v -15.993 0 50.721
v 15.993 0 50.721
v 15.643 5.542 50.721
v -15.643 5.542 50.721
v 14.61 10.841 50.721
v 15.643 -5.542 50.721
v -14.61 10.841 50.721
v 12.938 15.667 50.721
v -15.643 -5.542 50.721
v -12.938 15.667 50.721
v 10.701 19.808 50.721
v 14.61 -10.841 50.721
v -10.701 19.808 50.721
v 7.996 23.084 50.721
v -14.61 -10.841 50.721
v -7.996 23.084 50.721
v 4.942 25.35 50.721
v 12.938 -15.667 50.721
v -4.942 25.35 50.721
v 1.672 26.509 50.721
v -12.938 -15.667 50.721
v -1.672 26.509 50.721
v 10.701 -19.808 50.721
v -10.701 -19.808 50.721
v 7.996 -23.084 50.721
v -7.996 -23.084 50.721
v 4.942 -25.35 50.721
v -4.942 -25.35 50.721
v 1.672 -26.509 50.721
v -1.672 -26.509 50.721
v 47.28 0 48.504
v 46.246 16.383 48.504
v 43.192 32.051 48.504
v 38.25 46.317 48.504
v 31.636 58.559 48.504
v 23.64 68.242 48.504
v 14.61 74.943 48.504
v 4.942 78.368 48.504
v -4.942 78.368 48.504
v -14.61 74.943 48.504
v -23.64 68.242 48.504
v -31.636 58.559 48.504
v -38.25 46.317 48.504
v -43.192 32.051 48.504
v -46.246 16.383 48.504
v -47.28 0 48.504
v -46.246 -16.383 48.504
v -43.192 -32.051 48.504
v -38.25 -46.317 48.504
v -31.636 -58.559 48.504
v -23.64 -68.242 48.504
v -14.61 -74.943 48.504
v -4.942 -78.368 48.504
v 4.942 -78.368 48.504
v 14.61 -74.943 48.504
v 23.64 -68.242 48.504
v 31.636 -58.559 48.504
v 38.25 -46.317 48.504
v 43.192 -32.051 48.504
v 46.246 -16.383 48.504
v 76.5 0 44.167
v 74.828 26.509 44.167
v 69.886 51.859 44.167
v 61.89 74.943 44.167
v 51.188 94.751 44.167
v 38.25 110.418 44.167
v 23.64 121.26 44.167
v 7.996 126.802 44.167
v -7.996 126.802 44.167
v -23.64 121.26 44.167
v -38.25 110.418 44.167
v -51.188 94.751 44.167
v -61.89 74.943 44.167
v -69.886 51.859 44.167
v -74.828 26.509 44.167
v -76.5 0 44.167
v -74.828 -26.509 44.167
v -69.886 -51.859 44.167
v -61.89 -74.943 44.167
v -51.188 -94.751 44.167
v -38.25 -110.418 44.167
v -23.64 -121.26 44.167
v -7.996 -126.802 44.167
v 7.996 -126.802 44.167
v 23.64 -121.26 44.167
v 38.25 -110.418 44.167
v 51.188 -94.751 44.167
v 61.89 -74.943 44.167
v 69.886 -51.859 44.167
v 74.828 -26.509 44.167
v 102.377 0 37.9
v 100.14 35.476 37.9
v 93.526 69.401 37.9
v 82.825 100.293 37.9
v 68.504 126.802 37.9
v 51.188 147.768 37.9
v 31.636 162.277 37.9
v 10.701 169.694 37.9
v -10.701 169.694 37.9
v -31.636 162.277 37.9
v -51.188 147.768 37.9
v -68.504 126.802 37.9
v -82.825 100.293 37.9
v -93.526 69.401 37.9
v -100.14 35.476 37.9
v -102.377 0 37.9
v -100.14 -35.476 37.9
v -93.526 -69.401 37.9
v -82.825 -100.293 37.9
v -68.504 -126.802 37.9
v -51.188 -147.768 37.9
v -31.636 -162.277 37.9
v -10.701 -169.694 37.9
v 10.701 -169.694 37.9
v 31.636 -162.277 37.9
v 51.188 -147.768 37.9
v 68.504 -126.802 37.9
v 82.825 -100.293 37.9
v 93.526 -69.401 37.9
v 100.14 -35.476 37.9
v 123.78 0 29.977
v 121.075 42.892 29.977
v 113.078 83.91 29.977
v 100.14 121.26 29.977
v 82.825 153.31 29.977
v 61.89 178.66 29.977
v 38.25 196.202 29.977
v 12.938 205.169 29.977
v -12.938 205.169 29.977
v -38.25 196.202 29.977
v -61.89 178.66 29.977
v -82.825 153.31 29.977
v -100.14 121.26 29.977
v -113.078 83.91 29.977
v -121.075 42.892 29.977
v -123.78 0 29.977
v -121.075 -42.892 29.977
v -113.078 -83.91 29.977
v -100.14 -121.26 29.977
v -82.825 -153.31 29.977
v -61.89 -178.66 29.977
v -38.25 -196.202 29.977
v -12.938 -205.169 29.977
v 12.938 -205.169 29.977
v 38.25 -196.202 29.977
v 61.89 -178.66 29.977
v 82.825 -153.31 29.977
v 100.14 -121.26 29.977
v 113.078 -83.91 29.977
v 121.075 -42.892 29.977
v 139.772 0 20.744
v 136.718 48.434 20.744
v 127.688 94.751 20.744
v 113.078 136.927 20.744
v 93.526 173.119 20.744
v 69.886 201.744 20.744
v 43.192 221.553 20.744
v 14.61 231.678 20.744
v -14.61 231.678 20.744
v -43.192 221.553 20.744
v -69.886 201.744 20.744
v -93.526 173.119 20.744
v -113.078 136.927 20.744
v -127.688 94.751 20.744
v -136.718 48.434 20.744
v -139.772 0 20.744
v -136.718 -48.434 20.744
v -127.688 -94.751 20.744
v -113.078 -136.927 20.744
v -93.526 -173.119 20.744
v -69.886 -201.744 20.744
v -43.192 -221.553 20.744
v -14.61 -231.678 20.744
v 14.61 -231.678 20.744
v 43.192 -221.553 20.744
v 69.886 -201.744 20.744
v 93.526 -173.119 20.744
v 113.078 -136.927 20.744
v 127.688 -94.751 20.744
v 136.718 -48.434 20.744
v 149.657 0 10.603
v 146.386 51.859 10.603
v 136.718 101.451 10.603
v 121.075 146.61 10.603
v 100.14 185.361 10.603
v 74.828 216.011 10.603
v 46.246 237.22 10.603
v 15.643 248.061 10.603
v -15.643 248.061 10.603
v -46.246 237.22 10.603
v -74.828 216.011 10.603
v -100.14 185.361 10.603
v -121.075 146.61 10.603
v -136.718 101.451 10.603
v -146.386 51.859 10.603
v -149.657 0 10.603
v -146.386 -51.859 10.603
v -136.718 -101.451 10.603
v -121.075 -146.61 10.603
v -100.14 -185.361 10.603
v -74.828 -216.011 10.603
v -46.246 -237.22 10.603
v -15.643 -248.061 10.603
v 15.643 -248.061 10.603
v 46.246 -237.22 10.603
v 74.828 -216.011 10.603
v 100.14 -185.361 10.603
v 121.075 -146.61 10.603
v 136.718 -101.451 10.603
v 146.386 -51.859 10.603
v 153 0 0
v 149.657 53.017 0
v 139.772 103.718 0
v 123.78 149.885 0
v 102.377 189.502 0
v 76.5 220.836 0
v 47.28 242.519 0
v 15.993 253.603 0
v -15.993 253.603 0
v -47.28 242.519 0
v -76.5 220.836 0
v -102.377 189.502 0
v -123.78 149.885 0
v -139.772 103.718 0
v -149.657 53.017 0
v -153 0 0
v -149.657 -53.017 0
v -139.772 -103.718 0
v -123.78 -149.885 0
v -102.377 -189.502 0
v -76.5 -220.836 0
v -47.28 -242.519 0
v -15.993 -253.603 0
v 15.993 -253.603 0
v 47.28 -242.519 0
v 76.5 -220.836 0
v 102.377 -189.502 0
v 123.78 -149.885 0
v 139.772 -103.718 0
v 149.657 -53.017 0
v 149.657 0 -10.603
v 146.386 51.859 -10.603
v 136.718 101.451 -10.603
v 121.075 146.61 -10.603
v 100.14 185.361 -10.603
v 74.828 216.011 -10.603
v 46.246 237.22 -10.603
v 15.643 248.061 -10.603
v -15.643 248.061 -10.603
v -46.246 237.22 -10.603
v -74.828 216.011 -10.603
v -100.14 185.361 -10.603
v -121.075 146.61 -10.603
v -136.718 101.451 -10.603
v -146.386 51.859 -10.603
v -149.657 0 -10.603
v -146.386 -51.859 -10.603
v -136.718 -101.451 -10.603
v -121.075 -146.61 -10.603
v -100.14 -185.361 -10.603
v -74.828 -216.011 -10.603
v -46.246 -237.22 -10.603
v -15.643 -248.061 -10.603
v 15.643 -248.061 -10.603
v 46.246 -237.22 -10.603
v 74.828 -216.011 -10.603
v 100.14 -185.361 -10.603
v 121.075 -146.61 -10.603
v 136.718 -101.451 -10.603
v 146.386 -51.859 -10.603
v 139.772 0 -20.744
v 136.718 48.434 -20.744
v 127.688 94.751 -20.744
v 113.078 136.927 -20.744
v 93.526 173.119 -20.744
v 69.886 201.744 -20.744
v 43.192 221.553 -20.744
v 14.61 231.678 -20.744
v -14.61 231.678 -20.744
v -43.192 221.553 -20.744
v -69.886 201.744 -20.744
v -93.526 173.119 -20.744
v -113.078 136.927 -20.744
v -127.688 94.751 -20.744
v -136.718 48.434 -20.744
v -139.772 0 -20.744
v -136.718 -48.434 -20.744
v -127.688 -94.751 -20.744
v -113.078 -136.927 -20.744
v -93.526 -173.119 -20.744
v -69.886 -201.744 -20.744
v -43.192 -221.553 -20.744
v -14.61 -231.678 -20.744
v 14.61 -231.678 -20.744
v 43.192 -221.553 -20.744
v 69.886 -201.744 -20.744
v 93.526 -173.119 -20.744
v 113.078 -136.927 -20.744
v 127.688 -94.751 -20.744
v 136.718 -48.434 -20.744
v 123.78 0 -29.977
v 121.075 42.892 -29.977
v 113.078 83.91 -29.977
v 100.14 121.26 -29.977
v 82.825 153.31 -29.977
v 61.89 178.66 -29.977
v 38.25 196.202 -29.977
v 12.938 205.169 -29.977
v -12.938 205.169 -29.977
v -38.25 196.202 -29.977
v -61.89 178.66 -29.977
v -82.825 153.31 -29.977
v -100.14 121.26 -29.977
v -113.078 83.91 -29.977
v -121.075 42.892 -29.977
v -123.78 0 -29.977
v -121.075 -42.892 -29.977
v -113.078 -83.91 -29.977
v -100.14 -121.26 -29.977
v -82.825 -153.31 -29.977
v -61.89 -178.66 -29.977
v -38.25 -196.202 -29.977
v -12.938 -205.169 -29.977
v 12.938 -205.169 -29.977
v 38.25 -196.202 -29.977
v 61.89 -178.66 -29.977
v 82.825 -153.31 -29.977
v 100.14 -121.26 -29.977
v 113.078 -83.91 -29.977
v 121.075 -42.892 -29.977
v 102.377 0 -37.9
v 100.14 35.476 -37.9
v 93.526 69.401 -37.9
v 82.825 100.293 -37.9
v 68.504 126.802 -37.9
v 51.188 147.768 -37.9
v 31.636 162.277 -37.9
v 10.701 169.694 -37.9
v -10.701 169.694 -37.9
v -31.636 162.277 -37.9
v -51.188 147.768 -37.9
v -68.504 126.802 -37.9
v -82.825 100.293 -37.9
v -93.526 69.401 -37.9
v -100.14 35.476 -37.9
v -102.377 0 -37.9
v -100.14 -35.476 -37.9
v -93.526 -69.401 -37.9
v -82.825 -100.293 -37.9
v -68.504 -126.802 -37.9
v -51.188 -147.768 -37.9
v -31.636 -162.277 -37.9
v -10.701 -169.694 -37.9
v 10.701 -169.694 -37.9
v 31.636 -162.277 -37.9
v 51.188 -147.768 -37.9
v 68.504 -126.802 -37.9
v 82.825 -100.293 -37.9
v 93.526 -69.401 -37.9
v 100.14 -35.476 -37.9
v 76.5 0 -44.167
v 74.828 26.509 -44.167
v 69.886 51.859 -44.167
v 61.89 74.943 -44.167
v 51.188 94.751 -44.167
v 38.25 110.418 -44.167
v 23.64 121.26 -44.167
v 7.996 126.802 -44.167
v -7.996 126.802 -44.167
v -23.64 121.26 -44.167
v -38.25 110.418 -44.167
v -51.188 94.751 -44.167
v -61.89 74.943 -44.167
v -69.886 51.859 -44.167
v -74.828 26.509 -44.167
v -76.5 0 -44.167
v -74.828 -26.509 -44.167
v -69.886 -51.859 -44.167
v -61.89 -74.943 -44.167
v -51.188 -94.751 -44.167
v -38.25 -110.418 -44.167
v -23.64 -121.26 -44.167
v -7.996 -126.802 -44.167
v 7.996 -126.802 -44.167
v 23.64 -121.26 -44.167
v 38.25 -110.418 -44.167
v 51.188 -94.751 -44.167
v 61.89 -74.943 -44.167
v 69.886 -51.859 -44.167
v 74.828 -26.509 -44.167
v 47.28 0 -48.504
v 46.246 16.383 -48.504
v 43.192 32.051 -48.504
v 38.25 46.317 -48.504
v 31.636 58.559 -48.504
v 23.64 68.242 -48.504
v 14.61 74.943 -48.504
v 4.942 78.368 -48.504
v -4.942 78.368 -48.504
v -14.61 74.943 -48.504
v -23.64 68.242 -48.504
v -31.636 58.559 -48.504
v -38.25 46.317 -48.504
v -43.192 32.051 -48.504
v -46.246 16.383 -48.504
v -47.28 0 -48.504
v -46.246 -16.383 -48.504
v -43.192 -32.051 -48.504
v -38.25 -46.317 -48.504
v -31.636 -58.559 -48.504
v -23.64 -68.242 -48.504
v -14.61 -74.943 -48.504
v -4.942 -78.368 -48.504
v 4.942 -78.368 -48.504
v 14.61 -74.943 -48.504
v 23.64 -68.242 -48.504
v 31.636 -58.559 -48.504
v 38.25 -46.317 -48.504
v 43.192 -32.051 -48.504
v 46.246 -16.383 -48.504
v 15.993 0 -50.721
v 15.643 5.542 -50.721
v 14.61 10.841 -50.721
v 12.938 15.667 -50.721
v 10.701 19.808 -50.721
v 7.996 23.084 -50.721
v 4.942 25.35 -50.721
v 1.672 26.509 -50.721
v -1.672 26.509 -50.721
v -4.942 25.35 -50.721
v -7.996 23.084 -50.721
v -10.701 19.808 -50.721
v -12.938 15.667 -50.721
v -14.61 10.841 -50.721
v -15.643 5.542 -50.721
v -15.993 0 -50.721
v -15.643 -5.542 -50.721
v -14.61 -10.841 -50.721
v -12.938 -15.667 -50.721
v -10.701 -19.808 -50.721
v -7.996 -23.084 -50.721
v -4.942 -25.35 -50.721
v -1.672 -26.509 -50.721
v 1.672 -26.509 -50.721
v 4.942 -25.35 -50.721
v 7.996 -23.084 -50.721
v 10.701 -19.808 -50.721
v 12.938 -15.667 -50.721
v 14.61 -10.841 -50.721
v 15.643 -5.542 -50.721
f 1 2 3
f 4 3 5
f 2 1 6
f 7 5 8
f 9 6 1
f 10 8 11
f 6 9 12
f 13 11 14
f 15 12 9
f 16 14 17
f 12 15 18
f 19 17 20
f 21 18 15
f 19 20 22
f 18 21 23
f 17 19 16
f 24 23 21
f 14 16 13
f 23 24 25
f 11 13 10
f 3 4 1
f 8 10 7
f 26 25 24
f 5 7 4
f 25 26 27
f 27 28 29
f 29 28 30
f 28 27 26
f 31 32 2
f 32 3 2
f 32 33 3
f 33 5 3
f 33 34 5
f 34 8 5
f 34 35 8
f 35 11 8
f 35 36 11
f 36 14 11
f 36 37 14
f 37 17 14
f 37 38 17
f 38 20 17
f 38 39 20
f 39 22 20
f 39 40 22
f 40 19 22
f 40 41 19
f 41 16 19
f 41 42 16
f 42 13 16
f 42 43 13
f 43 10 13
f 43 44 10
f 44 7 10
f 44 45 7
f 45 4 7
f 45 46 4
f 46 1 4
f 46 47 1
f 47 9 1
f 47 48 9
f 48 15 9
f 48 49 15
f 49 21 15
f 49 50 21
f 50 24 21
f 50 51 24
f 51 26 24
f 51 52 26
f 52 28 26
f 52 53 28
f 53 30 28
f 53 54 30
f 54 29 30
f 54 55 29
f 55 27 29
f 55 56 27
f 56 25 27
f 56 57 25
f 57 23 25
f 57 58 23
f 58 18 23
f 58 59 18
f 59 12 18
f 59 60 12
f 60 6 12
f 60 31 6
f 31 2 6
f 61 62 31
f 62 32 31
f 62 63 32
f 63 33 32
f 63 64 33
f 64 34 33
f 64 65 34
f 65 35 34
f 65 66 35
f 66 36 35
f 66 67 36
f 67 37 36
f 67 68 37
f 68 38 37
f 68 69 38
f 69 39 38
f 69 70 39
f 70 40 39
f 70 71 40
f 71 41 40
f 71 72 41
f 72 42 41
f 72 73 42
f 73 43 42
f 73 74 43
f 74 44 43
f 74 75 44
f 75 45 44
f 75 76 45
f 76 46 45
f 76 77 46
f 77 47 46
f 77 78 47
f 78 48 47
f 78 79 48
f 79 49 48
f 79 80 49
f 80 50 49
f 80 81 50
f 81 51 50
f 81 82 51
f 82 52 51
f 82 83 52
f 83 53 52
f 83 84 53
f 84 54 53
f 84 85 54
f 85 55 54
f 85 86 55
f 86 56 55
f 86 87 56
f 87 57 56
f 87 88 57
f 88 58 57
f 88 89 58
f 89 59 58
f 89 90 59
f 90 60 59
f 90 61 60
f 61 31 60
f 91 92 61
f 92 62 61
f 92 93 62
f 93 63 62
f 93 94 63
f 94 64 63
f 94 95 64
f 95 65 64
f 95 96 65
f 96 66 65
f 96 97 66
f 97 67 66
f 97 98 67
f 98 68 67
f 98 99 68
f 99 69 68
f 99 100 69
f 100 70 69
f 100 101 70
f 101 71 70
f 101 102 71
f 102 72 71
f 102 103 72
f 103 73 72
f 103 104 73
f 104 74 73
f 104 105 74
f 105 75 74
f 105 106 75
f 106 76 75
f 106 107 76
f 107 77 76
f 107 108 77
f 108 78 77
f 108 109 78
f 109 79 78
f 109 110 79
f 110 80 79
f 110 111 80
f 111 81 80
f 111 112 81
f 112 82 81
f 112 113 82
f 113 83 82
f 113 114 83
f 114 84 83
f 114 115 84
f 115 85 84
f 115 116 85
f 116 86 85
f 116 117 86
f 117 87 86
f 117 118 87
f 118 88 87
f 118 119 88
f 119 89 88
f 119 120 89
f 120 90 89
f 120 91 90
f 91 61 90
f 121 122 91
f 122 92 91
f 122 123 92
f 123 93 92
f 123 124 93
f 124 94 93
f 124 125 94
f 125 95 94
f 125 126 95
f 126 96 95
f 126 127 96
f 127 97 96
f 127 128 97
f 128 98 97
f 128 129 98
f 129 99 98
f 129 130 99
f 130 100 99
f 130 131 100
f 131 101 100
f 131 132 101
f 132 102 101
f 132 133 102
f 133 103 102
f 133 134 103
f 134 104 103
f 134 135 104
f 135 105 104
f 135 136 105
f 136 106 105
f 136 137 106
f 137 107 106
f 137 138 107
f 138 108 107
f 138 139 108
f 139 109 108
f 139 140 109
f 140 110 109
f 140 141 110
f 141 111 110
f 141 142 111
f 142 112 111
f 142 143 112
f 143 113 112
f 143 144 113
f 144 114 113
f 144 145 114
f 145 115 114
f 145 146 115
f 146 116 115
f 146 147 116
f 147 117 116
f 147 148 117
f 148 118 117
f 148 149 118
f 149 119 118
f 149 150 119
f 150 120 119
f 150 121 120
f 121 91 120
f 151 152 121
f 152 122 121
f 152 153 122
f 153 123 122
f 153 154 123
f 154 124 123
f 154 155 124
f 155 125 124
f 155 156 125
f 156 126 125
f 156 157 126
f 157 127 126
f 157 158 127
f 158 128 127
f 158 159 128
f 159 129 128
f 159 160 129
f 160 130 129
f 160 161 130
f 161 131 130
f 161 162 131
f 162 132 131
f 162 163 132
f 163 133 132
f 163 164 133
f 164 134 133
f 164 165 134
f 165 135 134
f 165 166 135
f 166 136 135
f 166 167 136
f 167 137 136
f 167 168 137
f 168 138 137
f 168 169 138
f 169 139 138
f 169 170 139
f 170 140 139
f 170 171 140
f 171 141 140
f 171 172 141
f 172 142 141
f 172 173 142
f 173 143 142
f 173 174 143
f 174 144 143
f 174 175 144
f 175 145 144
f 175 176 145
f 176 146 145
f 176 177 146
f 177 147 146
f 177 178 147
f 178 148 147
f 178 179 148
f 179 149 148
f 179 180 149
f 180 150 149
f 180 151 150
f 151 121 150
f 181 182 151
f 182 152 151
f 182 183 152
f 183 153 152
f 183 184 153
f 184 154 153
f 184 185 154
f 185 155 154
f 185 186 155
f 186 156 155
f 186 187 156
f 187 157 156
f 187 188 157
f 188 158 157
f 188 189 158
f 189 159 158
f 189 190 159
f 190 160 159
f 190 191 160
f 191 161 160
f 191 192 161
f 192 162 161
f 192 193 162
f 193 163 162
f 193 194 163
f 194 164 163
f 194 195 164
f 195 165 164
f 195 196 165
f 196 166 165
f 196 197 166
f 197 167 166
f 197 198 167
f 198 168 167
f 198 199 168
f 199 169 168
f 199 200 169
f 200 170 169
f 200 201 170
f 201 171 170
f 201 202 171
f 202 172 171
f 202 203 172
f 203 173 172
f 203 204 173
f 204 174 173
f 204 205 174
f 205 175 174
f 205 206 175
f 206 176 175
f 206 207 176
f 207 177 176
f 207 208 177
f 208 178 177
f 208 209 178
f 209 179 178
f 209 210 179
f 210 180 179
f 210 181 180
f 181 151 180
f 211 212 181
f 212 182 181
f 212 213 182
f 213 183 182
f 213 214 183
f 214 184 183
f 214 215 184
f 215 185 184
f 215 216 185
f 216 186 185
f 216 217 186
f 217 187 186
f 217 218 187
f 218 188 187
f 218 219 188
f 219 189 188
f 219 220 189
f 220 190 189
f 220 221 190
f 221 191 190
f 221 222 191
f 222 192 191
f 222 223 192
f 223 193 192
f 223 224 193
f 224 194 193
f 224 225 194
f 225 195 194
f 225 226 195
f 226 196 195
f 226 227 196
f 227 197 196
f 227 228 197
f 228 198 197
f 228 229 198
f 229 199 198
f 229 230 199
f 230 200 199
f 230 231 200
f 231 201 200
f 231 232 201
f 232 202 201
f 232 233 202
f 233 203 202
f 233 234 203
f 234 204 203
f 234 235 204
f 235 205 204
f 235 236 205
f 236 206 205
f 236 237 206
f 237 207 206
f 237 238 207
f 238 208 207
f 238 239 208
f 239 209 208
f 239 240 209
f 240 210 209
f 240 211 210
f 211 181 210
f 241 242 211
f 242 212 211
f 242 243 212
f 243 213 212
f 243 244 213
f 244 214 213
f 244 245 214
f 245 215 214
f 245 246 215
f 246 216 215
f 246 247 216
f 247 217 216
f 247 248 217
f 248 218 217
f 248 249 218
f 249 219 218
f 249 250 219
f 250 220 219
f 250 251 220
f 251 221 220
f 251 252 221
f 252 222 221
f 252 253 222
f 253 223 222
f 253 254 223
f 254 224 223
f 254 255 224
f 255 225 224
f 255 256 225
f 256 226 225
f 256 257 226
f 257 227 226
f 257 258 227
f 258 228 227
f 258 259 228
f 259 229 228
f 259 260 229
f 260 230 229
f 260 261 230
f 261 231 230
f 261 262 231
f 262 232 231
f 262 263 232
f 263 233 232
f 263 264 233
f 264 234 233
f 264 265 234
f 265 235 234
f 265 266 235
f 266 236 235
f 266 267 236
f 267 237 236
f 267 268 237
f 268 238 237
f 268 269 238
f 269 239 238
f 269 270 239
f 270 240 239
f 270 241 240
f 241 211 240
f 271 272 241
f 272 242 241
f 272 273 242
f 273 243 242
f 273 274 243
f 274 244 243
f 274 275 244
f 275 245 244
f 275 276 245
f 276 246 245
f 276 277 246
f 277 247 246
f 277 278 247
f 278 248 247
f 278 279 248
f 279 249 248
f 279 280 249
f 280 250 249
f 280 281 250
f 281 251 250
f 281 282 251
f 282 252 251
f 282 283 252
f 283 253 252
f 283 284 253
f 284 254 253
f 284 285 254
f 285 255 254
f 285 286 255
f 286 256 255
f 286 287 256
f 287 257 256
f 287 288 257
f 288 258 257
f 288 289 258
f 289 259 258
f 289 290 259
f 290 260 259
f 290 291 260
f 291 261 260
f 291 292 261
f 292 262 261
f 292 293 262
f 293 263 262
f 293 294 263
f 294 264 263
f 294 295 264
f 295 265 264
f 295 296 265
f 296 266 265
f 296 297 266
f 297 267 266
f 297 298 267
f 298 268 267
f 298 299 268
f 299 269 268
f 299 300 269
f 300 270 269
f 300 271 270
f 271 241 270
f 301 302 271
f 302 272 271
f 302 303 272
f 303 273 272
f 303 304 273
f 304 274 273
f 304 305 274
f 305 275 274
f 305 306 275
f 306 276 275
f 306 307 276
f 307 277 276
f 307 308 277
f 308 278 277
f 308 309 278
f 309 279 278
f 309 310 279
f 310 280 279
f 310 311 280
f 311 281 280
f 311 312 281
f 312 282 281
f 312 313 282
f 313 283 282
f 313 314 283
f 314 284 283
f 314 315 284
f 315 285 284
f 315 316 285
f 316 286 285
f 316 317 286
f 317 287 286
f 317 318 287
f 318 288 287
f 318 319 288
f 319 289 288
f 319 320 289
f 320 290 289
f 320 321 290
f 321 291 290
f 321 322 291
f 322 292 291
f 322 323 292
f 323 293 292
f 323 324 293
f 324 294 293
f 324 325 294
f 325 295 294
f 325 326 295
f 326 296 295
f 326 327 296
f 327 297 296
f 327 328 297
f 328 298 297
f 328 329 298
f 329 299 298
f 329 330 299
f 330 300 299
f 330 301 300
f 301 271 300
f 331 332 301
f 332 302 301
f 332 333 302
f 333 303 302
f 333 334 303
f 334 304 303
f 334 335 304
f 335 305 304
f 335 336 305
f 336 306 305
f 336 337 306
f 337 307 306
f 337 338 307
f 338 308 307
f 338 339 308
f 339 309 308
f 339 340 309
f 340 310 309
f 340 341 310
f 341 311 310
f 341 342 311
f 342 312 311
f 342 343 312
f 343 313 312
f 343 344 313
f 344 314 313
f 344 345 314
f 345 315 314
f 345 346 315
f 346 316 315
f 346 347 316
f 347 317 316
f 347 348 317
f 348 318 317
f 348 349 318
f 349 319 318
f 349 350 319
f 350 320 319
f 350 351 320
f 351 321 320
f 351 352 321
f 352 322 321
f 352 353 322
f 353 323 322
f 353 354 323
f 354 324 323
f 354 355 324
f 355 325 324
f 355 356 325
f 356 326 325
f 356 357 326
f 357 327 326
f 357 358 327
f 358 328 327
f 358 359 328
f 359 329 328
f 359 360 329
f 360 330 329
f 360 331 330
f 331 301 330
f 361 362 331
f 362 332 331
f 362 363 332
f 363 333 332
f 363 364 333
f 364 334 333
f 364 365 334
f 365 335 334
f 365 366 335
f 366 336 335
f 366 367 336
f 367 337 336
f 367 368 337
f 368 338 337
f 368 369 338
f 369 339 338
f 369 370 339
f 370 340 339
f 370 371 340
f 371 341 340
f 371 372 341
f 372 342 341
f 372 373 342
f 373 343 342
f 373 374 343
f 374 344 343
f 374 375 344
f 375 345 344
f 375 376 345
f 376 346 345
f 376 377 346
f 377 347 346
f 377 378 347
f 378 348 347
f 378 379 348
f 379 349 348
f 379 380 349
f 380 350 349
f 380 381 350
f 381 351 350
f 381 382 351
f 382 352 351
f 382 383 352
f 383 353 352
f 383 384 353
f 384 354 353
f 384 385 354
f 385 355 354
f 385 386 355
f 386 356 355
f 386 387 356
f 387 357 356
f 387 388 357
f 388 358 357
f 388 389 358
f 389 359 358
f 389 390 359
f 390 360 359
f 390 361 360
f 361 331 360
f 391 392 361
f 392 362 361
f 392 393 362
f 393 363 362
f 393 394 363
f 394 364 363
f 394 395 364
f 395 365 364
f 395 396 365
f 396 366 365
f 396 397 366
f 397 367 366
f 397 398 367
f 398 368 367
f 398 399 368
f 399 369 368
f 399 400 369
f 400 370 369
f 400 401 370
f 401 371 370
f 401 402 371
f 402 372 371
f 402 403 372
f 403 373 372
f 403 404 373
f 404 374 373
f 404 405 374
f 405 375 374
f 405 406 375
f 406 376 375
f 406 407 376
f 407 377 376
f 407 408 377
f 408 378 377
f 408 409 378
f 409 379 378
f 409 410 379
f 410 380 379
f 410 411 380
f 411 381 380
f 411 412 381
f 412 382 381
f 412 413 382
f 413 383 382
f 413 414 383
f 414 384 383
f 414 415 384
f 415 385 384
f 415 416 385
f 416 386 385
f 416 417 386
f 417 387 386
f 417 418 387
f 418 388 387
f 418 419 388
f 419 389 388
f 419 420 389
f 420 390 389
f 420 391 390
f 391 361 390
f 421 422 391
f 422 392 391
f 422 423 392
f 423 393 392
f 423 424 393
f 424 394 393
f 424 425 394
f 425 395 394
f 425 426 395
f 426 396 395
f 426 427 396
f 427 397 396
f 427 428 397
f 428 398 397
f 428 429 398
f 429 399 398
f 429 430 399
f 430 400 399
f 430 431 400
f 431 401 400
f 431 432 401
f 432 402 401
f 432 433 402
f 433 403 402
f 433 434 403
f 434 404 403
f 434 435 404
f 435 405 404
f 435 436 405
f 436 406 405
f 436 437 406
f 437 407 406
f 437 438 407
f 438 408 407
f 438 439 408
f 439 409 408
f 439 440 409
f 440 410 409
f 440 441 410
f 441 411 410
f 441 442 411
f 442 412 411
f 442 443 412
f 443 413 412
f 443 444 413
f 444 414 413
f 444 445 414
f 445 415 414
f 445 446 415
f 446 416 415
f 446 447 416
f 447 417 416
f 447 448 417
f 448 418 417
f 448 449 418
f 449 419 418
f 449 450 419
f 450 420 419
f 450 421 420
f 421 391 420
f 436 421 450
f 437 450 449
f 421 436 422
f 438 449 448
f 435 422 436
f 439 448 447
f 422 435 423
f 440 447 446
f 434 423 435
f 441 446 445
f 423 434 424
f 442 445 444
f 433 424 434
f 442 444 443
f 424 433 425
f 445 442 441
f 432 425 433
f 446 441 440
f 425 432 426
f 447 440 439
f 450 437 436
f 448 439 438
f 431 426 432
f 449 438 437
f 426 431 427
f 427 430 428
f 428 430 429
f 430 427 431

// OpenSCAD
// Generated by SolidPython 1.0.1 on 2020-07-29 00:46:49


scale(v = [9, 15, 3]) {
	sphere(r = 17);
}
/***********************************************
*********      SolidPython code:      **********
************************************************
 
# import packages: SolidPython
from solid import *
from solid.utils import *
from itertools import chain, combinations, permutations


class Resize:

    def __init__(self, scad_file):
        self.scad_file = scad_file
        #self.scad_file = import_scad(scad_file)
        # cone/cylinder param:
        self.r1 = 0
        self.r2 = 0
        self.h = 0
        # rectangular prism param:
        self.w = 0
        self.l = 0
        # ellipse param:
        self.r = 0

    # import OpenScad code (file name corresponds to shape)


    # classify shape + parameters
    def assign(self, param1, param2, param3):
        if self.scad_file == 'cone.scad':
            self.r1 = param1
            self.r2 = param2
            self.h = param3
        elif self.scad_file == 'cylinder.scad':
            self.r1 = param1
            self.r2 = param2
            self.h = param3
        elif self.scad_file == 'rectangularPrism.scad':
            self.h = param1
            self.l = param2
            self.w = param3
        else:
            self.r = param1
            self.h = param2

    # resize parameters
    def iterate(self):
        x = range(3, 20, 2)
        i = 1
        if self.scad_file == 'cone.scad':
            tempList = list(permutations(x, 2))
            for temp in tempList:
                param1 = temp[0]
                param2 = temp[1]
                filepath = 'produced_scad_files/' + 'cone' + str(param1) + '_' + str(param2) + '_' + '.scad'
                scad_render_to_file(cylinder(h=param1, r1=param2, r2=0), filepath)

        elif self.scad_file == 'cylinder.scad':
            tempList = list(permutations(x, 3))
            for temp in tempList:
                param1 = temp[0]
                param2 = temp[1]
                filepath = 'produced_scad_files/' + 'cylinder' + str(param1) + '_' + str(param2) + '_' + '.scad'
                scad_render_to_file(cylinder(h=param1, r1=param2, r2=param2), filepath)

        elif self.scad_file == 'rectangularPrism.scad':
            tempList = list(permutations(x, 3))
            for temp in tempList:
                param1 = temp[0]
                param2 = temp[1]
                param3 = temp[2]
                filepath = 'produced_scad_files/' + 'rectangularPrism' + str(param1) + '_' + str(param2) + '_' + str(
                    param3) + '.scad'
                scad_render_to_file(cube(size=(param1, param2, param3)), filepath)

        elif self.scad_file == 'ellipse.scad':
            tempList = list(permutations(x, 4))
            for temp in tempList:
                param1 = temp[0]
                param2 = temp[1]
                param3 = temp[2]
                param4 = temp[3]
                filepath = 'produced_scad_files/' + 'ellipse' + str(param1) + '_' + str(param2) + '_' + str(param3) + '_' + str(param4) + '.scad'
                scad_render_to_file(scale([param1, param2, param3])(sphere(r=param4)), filepath)

    def render_to_scadfile(self):
        scad_render_to_file(scad, 'example.scad') 
 
************************************************/
